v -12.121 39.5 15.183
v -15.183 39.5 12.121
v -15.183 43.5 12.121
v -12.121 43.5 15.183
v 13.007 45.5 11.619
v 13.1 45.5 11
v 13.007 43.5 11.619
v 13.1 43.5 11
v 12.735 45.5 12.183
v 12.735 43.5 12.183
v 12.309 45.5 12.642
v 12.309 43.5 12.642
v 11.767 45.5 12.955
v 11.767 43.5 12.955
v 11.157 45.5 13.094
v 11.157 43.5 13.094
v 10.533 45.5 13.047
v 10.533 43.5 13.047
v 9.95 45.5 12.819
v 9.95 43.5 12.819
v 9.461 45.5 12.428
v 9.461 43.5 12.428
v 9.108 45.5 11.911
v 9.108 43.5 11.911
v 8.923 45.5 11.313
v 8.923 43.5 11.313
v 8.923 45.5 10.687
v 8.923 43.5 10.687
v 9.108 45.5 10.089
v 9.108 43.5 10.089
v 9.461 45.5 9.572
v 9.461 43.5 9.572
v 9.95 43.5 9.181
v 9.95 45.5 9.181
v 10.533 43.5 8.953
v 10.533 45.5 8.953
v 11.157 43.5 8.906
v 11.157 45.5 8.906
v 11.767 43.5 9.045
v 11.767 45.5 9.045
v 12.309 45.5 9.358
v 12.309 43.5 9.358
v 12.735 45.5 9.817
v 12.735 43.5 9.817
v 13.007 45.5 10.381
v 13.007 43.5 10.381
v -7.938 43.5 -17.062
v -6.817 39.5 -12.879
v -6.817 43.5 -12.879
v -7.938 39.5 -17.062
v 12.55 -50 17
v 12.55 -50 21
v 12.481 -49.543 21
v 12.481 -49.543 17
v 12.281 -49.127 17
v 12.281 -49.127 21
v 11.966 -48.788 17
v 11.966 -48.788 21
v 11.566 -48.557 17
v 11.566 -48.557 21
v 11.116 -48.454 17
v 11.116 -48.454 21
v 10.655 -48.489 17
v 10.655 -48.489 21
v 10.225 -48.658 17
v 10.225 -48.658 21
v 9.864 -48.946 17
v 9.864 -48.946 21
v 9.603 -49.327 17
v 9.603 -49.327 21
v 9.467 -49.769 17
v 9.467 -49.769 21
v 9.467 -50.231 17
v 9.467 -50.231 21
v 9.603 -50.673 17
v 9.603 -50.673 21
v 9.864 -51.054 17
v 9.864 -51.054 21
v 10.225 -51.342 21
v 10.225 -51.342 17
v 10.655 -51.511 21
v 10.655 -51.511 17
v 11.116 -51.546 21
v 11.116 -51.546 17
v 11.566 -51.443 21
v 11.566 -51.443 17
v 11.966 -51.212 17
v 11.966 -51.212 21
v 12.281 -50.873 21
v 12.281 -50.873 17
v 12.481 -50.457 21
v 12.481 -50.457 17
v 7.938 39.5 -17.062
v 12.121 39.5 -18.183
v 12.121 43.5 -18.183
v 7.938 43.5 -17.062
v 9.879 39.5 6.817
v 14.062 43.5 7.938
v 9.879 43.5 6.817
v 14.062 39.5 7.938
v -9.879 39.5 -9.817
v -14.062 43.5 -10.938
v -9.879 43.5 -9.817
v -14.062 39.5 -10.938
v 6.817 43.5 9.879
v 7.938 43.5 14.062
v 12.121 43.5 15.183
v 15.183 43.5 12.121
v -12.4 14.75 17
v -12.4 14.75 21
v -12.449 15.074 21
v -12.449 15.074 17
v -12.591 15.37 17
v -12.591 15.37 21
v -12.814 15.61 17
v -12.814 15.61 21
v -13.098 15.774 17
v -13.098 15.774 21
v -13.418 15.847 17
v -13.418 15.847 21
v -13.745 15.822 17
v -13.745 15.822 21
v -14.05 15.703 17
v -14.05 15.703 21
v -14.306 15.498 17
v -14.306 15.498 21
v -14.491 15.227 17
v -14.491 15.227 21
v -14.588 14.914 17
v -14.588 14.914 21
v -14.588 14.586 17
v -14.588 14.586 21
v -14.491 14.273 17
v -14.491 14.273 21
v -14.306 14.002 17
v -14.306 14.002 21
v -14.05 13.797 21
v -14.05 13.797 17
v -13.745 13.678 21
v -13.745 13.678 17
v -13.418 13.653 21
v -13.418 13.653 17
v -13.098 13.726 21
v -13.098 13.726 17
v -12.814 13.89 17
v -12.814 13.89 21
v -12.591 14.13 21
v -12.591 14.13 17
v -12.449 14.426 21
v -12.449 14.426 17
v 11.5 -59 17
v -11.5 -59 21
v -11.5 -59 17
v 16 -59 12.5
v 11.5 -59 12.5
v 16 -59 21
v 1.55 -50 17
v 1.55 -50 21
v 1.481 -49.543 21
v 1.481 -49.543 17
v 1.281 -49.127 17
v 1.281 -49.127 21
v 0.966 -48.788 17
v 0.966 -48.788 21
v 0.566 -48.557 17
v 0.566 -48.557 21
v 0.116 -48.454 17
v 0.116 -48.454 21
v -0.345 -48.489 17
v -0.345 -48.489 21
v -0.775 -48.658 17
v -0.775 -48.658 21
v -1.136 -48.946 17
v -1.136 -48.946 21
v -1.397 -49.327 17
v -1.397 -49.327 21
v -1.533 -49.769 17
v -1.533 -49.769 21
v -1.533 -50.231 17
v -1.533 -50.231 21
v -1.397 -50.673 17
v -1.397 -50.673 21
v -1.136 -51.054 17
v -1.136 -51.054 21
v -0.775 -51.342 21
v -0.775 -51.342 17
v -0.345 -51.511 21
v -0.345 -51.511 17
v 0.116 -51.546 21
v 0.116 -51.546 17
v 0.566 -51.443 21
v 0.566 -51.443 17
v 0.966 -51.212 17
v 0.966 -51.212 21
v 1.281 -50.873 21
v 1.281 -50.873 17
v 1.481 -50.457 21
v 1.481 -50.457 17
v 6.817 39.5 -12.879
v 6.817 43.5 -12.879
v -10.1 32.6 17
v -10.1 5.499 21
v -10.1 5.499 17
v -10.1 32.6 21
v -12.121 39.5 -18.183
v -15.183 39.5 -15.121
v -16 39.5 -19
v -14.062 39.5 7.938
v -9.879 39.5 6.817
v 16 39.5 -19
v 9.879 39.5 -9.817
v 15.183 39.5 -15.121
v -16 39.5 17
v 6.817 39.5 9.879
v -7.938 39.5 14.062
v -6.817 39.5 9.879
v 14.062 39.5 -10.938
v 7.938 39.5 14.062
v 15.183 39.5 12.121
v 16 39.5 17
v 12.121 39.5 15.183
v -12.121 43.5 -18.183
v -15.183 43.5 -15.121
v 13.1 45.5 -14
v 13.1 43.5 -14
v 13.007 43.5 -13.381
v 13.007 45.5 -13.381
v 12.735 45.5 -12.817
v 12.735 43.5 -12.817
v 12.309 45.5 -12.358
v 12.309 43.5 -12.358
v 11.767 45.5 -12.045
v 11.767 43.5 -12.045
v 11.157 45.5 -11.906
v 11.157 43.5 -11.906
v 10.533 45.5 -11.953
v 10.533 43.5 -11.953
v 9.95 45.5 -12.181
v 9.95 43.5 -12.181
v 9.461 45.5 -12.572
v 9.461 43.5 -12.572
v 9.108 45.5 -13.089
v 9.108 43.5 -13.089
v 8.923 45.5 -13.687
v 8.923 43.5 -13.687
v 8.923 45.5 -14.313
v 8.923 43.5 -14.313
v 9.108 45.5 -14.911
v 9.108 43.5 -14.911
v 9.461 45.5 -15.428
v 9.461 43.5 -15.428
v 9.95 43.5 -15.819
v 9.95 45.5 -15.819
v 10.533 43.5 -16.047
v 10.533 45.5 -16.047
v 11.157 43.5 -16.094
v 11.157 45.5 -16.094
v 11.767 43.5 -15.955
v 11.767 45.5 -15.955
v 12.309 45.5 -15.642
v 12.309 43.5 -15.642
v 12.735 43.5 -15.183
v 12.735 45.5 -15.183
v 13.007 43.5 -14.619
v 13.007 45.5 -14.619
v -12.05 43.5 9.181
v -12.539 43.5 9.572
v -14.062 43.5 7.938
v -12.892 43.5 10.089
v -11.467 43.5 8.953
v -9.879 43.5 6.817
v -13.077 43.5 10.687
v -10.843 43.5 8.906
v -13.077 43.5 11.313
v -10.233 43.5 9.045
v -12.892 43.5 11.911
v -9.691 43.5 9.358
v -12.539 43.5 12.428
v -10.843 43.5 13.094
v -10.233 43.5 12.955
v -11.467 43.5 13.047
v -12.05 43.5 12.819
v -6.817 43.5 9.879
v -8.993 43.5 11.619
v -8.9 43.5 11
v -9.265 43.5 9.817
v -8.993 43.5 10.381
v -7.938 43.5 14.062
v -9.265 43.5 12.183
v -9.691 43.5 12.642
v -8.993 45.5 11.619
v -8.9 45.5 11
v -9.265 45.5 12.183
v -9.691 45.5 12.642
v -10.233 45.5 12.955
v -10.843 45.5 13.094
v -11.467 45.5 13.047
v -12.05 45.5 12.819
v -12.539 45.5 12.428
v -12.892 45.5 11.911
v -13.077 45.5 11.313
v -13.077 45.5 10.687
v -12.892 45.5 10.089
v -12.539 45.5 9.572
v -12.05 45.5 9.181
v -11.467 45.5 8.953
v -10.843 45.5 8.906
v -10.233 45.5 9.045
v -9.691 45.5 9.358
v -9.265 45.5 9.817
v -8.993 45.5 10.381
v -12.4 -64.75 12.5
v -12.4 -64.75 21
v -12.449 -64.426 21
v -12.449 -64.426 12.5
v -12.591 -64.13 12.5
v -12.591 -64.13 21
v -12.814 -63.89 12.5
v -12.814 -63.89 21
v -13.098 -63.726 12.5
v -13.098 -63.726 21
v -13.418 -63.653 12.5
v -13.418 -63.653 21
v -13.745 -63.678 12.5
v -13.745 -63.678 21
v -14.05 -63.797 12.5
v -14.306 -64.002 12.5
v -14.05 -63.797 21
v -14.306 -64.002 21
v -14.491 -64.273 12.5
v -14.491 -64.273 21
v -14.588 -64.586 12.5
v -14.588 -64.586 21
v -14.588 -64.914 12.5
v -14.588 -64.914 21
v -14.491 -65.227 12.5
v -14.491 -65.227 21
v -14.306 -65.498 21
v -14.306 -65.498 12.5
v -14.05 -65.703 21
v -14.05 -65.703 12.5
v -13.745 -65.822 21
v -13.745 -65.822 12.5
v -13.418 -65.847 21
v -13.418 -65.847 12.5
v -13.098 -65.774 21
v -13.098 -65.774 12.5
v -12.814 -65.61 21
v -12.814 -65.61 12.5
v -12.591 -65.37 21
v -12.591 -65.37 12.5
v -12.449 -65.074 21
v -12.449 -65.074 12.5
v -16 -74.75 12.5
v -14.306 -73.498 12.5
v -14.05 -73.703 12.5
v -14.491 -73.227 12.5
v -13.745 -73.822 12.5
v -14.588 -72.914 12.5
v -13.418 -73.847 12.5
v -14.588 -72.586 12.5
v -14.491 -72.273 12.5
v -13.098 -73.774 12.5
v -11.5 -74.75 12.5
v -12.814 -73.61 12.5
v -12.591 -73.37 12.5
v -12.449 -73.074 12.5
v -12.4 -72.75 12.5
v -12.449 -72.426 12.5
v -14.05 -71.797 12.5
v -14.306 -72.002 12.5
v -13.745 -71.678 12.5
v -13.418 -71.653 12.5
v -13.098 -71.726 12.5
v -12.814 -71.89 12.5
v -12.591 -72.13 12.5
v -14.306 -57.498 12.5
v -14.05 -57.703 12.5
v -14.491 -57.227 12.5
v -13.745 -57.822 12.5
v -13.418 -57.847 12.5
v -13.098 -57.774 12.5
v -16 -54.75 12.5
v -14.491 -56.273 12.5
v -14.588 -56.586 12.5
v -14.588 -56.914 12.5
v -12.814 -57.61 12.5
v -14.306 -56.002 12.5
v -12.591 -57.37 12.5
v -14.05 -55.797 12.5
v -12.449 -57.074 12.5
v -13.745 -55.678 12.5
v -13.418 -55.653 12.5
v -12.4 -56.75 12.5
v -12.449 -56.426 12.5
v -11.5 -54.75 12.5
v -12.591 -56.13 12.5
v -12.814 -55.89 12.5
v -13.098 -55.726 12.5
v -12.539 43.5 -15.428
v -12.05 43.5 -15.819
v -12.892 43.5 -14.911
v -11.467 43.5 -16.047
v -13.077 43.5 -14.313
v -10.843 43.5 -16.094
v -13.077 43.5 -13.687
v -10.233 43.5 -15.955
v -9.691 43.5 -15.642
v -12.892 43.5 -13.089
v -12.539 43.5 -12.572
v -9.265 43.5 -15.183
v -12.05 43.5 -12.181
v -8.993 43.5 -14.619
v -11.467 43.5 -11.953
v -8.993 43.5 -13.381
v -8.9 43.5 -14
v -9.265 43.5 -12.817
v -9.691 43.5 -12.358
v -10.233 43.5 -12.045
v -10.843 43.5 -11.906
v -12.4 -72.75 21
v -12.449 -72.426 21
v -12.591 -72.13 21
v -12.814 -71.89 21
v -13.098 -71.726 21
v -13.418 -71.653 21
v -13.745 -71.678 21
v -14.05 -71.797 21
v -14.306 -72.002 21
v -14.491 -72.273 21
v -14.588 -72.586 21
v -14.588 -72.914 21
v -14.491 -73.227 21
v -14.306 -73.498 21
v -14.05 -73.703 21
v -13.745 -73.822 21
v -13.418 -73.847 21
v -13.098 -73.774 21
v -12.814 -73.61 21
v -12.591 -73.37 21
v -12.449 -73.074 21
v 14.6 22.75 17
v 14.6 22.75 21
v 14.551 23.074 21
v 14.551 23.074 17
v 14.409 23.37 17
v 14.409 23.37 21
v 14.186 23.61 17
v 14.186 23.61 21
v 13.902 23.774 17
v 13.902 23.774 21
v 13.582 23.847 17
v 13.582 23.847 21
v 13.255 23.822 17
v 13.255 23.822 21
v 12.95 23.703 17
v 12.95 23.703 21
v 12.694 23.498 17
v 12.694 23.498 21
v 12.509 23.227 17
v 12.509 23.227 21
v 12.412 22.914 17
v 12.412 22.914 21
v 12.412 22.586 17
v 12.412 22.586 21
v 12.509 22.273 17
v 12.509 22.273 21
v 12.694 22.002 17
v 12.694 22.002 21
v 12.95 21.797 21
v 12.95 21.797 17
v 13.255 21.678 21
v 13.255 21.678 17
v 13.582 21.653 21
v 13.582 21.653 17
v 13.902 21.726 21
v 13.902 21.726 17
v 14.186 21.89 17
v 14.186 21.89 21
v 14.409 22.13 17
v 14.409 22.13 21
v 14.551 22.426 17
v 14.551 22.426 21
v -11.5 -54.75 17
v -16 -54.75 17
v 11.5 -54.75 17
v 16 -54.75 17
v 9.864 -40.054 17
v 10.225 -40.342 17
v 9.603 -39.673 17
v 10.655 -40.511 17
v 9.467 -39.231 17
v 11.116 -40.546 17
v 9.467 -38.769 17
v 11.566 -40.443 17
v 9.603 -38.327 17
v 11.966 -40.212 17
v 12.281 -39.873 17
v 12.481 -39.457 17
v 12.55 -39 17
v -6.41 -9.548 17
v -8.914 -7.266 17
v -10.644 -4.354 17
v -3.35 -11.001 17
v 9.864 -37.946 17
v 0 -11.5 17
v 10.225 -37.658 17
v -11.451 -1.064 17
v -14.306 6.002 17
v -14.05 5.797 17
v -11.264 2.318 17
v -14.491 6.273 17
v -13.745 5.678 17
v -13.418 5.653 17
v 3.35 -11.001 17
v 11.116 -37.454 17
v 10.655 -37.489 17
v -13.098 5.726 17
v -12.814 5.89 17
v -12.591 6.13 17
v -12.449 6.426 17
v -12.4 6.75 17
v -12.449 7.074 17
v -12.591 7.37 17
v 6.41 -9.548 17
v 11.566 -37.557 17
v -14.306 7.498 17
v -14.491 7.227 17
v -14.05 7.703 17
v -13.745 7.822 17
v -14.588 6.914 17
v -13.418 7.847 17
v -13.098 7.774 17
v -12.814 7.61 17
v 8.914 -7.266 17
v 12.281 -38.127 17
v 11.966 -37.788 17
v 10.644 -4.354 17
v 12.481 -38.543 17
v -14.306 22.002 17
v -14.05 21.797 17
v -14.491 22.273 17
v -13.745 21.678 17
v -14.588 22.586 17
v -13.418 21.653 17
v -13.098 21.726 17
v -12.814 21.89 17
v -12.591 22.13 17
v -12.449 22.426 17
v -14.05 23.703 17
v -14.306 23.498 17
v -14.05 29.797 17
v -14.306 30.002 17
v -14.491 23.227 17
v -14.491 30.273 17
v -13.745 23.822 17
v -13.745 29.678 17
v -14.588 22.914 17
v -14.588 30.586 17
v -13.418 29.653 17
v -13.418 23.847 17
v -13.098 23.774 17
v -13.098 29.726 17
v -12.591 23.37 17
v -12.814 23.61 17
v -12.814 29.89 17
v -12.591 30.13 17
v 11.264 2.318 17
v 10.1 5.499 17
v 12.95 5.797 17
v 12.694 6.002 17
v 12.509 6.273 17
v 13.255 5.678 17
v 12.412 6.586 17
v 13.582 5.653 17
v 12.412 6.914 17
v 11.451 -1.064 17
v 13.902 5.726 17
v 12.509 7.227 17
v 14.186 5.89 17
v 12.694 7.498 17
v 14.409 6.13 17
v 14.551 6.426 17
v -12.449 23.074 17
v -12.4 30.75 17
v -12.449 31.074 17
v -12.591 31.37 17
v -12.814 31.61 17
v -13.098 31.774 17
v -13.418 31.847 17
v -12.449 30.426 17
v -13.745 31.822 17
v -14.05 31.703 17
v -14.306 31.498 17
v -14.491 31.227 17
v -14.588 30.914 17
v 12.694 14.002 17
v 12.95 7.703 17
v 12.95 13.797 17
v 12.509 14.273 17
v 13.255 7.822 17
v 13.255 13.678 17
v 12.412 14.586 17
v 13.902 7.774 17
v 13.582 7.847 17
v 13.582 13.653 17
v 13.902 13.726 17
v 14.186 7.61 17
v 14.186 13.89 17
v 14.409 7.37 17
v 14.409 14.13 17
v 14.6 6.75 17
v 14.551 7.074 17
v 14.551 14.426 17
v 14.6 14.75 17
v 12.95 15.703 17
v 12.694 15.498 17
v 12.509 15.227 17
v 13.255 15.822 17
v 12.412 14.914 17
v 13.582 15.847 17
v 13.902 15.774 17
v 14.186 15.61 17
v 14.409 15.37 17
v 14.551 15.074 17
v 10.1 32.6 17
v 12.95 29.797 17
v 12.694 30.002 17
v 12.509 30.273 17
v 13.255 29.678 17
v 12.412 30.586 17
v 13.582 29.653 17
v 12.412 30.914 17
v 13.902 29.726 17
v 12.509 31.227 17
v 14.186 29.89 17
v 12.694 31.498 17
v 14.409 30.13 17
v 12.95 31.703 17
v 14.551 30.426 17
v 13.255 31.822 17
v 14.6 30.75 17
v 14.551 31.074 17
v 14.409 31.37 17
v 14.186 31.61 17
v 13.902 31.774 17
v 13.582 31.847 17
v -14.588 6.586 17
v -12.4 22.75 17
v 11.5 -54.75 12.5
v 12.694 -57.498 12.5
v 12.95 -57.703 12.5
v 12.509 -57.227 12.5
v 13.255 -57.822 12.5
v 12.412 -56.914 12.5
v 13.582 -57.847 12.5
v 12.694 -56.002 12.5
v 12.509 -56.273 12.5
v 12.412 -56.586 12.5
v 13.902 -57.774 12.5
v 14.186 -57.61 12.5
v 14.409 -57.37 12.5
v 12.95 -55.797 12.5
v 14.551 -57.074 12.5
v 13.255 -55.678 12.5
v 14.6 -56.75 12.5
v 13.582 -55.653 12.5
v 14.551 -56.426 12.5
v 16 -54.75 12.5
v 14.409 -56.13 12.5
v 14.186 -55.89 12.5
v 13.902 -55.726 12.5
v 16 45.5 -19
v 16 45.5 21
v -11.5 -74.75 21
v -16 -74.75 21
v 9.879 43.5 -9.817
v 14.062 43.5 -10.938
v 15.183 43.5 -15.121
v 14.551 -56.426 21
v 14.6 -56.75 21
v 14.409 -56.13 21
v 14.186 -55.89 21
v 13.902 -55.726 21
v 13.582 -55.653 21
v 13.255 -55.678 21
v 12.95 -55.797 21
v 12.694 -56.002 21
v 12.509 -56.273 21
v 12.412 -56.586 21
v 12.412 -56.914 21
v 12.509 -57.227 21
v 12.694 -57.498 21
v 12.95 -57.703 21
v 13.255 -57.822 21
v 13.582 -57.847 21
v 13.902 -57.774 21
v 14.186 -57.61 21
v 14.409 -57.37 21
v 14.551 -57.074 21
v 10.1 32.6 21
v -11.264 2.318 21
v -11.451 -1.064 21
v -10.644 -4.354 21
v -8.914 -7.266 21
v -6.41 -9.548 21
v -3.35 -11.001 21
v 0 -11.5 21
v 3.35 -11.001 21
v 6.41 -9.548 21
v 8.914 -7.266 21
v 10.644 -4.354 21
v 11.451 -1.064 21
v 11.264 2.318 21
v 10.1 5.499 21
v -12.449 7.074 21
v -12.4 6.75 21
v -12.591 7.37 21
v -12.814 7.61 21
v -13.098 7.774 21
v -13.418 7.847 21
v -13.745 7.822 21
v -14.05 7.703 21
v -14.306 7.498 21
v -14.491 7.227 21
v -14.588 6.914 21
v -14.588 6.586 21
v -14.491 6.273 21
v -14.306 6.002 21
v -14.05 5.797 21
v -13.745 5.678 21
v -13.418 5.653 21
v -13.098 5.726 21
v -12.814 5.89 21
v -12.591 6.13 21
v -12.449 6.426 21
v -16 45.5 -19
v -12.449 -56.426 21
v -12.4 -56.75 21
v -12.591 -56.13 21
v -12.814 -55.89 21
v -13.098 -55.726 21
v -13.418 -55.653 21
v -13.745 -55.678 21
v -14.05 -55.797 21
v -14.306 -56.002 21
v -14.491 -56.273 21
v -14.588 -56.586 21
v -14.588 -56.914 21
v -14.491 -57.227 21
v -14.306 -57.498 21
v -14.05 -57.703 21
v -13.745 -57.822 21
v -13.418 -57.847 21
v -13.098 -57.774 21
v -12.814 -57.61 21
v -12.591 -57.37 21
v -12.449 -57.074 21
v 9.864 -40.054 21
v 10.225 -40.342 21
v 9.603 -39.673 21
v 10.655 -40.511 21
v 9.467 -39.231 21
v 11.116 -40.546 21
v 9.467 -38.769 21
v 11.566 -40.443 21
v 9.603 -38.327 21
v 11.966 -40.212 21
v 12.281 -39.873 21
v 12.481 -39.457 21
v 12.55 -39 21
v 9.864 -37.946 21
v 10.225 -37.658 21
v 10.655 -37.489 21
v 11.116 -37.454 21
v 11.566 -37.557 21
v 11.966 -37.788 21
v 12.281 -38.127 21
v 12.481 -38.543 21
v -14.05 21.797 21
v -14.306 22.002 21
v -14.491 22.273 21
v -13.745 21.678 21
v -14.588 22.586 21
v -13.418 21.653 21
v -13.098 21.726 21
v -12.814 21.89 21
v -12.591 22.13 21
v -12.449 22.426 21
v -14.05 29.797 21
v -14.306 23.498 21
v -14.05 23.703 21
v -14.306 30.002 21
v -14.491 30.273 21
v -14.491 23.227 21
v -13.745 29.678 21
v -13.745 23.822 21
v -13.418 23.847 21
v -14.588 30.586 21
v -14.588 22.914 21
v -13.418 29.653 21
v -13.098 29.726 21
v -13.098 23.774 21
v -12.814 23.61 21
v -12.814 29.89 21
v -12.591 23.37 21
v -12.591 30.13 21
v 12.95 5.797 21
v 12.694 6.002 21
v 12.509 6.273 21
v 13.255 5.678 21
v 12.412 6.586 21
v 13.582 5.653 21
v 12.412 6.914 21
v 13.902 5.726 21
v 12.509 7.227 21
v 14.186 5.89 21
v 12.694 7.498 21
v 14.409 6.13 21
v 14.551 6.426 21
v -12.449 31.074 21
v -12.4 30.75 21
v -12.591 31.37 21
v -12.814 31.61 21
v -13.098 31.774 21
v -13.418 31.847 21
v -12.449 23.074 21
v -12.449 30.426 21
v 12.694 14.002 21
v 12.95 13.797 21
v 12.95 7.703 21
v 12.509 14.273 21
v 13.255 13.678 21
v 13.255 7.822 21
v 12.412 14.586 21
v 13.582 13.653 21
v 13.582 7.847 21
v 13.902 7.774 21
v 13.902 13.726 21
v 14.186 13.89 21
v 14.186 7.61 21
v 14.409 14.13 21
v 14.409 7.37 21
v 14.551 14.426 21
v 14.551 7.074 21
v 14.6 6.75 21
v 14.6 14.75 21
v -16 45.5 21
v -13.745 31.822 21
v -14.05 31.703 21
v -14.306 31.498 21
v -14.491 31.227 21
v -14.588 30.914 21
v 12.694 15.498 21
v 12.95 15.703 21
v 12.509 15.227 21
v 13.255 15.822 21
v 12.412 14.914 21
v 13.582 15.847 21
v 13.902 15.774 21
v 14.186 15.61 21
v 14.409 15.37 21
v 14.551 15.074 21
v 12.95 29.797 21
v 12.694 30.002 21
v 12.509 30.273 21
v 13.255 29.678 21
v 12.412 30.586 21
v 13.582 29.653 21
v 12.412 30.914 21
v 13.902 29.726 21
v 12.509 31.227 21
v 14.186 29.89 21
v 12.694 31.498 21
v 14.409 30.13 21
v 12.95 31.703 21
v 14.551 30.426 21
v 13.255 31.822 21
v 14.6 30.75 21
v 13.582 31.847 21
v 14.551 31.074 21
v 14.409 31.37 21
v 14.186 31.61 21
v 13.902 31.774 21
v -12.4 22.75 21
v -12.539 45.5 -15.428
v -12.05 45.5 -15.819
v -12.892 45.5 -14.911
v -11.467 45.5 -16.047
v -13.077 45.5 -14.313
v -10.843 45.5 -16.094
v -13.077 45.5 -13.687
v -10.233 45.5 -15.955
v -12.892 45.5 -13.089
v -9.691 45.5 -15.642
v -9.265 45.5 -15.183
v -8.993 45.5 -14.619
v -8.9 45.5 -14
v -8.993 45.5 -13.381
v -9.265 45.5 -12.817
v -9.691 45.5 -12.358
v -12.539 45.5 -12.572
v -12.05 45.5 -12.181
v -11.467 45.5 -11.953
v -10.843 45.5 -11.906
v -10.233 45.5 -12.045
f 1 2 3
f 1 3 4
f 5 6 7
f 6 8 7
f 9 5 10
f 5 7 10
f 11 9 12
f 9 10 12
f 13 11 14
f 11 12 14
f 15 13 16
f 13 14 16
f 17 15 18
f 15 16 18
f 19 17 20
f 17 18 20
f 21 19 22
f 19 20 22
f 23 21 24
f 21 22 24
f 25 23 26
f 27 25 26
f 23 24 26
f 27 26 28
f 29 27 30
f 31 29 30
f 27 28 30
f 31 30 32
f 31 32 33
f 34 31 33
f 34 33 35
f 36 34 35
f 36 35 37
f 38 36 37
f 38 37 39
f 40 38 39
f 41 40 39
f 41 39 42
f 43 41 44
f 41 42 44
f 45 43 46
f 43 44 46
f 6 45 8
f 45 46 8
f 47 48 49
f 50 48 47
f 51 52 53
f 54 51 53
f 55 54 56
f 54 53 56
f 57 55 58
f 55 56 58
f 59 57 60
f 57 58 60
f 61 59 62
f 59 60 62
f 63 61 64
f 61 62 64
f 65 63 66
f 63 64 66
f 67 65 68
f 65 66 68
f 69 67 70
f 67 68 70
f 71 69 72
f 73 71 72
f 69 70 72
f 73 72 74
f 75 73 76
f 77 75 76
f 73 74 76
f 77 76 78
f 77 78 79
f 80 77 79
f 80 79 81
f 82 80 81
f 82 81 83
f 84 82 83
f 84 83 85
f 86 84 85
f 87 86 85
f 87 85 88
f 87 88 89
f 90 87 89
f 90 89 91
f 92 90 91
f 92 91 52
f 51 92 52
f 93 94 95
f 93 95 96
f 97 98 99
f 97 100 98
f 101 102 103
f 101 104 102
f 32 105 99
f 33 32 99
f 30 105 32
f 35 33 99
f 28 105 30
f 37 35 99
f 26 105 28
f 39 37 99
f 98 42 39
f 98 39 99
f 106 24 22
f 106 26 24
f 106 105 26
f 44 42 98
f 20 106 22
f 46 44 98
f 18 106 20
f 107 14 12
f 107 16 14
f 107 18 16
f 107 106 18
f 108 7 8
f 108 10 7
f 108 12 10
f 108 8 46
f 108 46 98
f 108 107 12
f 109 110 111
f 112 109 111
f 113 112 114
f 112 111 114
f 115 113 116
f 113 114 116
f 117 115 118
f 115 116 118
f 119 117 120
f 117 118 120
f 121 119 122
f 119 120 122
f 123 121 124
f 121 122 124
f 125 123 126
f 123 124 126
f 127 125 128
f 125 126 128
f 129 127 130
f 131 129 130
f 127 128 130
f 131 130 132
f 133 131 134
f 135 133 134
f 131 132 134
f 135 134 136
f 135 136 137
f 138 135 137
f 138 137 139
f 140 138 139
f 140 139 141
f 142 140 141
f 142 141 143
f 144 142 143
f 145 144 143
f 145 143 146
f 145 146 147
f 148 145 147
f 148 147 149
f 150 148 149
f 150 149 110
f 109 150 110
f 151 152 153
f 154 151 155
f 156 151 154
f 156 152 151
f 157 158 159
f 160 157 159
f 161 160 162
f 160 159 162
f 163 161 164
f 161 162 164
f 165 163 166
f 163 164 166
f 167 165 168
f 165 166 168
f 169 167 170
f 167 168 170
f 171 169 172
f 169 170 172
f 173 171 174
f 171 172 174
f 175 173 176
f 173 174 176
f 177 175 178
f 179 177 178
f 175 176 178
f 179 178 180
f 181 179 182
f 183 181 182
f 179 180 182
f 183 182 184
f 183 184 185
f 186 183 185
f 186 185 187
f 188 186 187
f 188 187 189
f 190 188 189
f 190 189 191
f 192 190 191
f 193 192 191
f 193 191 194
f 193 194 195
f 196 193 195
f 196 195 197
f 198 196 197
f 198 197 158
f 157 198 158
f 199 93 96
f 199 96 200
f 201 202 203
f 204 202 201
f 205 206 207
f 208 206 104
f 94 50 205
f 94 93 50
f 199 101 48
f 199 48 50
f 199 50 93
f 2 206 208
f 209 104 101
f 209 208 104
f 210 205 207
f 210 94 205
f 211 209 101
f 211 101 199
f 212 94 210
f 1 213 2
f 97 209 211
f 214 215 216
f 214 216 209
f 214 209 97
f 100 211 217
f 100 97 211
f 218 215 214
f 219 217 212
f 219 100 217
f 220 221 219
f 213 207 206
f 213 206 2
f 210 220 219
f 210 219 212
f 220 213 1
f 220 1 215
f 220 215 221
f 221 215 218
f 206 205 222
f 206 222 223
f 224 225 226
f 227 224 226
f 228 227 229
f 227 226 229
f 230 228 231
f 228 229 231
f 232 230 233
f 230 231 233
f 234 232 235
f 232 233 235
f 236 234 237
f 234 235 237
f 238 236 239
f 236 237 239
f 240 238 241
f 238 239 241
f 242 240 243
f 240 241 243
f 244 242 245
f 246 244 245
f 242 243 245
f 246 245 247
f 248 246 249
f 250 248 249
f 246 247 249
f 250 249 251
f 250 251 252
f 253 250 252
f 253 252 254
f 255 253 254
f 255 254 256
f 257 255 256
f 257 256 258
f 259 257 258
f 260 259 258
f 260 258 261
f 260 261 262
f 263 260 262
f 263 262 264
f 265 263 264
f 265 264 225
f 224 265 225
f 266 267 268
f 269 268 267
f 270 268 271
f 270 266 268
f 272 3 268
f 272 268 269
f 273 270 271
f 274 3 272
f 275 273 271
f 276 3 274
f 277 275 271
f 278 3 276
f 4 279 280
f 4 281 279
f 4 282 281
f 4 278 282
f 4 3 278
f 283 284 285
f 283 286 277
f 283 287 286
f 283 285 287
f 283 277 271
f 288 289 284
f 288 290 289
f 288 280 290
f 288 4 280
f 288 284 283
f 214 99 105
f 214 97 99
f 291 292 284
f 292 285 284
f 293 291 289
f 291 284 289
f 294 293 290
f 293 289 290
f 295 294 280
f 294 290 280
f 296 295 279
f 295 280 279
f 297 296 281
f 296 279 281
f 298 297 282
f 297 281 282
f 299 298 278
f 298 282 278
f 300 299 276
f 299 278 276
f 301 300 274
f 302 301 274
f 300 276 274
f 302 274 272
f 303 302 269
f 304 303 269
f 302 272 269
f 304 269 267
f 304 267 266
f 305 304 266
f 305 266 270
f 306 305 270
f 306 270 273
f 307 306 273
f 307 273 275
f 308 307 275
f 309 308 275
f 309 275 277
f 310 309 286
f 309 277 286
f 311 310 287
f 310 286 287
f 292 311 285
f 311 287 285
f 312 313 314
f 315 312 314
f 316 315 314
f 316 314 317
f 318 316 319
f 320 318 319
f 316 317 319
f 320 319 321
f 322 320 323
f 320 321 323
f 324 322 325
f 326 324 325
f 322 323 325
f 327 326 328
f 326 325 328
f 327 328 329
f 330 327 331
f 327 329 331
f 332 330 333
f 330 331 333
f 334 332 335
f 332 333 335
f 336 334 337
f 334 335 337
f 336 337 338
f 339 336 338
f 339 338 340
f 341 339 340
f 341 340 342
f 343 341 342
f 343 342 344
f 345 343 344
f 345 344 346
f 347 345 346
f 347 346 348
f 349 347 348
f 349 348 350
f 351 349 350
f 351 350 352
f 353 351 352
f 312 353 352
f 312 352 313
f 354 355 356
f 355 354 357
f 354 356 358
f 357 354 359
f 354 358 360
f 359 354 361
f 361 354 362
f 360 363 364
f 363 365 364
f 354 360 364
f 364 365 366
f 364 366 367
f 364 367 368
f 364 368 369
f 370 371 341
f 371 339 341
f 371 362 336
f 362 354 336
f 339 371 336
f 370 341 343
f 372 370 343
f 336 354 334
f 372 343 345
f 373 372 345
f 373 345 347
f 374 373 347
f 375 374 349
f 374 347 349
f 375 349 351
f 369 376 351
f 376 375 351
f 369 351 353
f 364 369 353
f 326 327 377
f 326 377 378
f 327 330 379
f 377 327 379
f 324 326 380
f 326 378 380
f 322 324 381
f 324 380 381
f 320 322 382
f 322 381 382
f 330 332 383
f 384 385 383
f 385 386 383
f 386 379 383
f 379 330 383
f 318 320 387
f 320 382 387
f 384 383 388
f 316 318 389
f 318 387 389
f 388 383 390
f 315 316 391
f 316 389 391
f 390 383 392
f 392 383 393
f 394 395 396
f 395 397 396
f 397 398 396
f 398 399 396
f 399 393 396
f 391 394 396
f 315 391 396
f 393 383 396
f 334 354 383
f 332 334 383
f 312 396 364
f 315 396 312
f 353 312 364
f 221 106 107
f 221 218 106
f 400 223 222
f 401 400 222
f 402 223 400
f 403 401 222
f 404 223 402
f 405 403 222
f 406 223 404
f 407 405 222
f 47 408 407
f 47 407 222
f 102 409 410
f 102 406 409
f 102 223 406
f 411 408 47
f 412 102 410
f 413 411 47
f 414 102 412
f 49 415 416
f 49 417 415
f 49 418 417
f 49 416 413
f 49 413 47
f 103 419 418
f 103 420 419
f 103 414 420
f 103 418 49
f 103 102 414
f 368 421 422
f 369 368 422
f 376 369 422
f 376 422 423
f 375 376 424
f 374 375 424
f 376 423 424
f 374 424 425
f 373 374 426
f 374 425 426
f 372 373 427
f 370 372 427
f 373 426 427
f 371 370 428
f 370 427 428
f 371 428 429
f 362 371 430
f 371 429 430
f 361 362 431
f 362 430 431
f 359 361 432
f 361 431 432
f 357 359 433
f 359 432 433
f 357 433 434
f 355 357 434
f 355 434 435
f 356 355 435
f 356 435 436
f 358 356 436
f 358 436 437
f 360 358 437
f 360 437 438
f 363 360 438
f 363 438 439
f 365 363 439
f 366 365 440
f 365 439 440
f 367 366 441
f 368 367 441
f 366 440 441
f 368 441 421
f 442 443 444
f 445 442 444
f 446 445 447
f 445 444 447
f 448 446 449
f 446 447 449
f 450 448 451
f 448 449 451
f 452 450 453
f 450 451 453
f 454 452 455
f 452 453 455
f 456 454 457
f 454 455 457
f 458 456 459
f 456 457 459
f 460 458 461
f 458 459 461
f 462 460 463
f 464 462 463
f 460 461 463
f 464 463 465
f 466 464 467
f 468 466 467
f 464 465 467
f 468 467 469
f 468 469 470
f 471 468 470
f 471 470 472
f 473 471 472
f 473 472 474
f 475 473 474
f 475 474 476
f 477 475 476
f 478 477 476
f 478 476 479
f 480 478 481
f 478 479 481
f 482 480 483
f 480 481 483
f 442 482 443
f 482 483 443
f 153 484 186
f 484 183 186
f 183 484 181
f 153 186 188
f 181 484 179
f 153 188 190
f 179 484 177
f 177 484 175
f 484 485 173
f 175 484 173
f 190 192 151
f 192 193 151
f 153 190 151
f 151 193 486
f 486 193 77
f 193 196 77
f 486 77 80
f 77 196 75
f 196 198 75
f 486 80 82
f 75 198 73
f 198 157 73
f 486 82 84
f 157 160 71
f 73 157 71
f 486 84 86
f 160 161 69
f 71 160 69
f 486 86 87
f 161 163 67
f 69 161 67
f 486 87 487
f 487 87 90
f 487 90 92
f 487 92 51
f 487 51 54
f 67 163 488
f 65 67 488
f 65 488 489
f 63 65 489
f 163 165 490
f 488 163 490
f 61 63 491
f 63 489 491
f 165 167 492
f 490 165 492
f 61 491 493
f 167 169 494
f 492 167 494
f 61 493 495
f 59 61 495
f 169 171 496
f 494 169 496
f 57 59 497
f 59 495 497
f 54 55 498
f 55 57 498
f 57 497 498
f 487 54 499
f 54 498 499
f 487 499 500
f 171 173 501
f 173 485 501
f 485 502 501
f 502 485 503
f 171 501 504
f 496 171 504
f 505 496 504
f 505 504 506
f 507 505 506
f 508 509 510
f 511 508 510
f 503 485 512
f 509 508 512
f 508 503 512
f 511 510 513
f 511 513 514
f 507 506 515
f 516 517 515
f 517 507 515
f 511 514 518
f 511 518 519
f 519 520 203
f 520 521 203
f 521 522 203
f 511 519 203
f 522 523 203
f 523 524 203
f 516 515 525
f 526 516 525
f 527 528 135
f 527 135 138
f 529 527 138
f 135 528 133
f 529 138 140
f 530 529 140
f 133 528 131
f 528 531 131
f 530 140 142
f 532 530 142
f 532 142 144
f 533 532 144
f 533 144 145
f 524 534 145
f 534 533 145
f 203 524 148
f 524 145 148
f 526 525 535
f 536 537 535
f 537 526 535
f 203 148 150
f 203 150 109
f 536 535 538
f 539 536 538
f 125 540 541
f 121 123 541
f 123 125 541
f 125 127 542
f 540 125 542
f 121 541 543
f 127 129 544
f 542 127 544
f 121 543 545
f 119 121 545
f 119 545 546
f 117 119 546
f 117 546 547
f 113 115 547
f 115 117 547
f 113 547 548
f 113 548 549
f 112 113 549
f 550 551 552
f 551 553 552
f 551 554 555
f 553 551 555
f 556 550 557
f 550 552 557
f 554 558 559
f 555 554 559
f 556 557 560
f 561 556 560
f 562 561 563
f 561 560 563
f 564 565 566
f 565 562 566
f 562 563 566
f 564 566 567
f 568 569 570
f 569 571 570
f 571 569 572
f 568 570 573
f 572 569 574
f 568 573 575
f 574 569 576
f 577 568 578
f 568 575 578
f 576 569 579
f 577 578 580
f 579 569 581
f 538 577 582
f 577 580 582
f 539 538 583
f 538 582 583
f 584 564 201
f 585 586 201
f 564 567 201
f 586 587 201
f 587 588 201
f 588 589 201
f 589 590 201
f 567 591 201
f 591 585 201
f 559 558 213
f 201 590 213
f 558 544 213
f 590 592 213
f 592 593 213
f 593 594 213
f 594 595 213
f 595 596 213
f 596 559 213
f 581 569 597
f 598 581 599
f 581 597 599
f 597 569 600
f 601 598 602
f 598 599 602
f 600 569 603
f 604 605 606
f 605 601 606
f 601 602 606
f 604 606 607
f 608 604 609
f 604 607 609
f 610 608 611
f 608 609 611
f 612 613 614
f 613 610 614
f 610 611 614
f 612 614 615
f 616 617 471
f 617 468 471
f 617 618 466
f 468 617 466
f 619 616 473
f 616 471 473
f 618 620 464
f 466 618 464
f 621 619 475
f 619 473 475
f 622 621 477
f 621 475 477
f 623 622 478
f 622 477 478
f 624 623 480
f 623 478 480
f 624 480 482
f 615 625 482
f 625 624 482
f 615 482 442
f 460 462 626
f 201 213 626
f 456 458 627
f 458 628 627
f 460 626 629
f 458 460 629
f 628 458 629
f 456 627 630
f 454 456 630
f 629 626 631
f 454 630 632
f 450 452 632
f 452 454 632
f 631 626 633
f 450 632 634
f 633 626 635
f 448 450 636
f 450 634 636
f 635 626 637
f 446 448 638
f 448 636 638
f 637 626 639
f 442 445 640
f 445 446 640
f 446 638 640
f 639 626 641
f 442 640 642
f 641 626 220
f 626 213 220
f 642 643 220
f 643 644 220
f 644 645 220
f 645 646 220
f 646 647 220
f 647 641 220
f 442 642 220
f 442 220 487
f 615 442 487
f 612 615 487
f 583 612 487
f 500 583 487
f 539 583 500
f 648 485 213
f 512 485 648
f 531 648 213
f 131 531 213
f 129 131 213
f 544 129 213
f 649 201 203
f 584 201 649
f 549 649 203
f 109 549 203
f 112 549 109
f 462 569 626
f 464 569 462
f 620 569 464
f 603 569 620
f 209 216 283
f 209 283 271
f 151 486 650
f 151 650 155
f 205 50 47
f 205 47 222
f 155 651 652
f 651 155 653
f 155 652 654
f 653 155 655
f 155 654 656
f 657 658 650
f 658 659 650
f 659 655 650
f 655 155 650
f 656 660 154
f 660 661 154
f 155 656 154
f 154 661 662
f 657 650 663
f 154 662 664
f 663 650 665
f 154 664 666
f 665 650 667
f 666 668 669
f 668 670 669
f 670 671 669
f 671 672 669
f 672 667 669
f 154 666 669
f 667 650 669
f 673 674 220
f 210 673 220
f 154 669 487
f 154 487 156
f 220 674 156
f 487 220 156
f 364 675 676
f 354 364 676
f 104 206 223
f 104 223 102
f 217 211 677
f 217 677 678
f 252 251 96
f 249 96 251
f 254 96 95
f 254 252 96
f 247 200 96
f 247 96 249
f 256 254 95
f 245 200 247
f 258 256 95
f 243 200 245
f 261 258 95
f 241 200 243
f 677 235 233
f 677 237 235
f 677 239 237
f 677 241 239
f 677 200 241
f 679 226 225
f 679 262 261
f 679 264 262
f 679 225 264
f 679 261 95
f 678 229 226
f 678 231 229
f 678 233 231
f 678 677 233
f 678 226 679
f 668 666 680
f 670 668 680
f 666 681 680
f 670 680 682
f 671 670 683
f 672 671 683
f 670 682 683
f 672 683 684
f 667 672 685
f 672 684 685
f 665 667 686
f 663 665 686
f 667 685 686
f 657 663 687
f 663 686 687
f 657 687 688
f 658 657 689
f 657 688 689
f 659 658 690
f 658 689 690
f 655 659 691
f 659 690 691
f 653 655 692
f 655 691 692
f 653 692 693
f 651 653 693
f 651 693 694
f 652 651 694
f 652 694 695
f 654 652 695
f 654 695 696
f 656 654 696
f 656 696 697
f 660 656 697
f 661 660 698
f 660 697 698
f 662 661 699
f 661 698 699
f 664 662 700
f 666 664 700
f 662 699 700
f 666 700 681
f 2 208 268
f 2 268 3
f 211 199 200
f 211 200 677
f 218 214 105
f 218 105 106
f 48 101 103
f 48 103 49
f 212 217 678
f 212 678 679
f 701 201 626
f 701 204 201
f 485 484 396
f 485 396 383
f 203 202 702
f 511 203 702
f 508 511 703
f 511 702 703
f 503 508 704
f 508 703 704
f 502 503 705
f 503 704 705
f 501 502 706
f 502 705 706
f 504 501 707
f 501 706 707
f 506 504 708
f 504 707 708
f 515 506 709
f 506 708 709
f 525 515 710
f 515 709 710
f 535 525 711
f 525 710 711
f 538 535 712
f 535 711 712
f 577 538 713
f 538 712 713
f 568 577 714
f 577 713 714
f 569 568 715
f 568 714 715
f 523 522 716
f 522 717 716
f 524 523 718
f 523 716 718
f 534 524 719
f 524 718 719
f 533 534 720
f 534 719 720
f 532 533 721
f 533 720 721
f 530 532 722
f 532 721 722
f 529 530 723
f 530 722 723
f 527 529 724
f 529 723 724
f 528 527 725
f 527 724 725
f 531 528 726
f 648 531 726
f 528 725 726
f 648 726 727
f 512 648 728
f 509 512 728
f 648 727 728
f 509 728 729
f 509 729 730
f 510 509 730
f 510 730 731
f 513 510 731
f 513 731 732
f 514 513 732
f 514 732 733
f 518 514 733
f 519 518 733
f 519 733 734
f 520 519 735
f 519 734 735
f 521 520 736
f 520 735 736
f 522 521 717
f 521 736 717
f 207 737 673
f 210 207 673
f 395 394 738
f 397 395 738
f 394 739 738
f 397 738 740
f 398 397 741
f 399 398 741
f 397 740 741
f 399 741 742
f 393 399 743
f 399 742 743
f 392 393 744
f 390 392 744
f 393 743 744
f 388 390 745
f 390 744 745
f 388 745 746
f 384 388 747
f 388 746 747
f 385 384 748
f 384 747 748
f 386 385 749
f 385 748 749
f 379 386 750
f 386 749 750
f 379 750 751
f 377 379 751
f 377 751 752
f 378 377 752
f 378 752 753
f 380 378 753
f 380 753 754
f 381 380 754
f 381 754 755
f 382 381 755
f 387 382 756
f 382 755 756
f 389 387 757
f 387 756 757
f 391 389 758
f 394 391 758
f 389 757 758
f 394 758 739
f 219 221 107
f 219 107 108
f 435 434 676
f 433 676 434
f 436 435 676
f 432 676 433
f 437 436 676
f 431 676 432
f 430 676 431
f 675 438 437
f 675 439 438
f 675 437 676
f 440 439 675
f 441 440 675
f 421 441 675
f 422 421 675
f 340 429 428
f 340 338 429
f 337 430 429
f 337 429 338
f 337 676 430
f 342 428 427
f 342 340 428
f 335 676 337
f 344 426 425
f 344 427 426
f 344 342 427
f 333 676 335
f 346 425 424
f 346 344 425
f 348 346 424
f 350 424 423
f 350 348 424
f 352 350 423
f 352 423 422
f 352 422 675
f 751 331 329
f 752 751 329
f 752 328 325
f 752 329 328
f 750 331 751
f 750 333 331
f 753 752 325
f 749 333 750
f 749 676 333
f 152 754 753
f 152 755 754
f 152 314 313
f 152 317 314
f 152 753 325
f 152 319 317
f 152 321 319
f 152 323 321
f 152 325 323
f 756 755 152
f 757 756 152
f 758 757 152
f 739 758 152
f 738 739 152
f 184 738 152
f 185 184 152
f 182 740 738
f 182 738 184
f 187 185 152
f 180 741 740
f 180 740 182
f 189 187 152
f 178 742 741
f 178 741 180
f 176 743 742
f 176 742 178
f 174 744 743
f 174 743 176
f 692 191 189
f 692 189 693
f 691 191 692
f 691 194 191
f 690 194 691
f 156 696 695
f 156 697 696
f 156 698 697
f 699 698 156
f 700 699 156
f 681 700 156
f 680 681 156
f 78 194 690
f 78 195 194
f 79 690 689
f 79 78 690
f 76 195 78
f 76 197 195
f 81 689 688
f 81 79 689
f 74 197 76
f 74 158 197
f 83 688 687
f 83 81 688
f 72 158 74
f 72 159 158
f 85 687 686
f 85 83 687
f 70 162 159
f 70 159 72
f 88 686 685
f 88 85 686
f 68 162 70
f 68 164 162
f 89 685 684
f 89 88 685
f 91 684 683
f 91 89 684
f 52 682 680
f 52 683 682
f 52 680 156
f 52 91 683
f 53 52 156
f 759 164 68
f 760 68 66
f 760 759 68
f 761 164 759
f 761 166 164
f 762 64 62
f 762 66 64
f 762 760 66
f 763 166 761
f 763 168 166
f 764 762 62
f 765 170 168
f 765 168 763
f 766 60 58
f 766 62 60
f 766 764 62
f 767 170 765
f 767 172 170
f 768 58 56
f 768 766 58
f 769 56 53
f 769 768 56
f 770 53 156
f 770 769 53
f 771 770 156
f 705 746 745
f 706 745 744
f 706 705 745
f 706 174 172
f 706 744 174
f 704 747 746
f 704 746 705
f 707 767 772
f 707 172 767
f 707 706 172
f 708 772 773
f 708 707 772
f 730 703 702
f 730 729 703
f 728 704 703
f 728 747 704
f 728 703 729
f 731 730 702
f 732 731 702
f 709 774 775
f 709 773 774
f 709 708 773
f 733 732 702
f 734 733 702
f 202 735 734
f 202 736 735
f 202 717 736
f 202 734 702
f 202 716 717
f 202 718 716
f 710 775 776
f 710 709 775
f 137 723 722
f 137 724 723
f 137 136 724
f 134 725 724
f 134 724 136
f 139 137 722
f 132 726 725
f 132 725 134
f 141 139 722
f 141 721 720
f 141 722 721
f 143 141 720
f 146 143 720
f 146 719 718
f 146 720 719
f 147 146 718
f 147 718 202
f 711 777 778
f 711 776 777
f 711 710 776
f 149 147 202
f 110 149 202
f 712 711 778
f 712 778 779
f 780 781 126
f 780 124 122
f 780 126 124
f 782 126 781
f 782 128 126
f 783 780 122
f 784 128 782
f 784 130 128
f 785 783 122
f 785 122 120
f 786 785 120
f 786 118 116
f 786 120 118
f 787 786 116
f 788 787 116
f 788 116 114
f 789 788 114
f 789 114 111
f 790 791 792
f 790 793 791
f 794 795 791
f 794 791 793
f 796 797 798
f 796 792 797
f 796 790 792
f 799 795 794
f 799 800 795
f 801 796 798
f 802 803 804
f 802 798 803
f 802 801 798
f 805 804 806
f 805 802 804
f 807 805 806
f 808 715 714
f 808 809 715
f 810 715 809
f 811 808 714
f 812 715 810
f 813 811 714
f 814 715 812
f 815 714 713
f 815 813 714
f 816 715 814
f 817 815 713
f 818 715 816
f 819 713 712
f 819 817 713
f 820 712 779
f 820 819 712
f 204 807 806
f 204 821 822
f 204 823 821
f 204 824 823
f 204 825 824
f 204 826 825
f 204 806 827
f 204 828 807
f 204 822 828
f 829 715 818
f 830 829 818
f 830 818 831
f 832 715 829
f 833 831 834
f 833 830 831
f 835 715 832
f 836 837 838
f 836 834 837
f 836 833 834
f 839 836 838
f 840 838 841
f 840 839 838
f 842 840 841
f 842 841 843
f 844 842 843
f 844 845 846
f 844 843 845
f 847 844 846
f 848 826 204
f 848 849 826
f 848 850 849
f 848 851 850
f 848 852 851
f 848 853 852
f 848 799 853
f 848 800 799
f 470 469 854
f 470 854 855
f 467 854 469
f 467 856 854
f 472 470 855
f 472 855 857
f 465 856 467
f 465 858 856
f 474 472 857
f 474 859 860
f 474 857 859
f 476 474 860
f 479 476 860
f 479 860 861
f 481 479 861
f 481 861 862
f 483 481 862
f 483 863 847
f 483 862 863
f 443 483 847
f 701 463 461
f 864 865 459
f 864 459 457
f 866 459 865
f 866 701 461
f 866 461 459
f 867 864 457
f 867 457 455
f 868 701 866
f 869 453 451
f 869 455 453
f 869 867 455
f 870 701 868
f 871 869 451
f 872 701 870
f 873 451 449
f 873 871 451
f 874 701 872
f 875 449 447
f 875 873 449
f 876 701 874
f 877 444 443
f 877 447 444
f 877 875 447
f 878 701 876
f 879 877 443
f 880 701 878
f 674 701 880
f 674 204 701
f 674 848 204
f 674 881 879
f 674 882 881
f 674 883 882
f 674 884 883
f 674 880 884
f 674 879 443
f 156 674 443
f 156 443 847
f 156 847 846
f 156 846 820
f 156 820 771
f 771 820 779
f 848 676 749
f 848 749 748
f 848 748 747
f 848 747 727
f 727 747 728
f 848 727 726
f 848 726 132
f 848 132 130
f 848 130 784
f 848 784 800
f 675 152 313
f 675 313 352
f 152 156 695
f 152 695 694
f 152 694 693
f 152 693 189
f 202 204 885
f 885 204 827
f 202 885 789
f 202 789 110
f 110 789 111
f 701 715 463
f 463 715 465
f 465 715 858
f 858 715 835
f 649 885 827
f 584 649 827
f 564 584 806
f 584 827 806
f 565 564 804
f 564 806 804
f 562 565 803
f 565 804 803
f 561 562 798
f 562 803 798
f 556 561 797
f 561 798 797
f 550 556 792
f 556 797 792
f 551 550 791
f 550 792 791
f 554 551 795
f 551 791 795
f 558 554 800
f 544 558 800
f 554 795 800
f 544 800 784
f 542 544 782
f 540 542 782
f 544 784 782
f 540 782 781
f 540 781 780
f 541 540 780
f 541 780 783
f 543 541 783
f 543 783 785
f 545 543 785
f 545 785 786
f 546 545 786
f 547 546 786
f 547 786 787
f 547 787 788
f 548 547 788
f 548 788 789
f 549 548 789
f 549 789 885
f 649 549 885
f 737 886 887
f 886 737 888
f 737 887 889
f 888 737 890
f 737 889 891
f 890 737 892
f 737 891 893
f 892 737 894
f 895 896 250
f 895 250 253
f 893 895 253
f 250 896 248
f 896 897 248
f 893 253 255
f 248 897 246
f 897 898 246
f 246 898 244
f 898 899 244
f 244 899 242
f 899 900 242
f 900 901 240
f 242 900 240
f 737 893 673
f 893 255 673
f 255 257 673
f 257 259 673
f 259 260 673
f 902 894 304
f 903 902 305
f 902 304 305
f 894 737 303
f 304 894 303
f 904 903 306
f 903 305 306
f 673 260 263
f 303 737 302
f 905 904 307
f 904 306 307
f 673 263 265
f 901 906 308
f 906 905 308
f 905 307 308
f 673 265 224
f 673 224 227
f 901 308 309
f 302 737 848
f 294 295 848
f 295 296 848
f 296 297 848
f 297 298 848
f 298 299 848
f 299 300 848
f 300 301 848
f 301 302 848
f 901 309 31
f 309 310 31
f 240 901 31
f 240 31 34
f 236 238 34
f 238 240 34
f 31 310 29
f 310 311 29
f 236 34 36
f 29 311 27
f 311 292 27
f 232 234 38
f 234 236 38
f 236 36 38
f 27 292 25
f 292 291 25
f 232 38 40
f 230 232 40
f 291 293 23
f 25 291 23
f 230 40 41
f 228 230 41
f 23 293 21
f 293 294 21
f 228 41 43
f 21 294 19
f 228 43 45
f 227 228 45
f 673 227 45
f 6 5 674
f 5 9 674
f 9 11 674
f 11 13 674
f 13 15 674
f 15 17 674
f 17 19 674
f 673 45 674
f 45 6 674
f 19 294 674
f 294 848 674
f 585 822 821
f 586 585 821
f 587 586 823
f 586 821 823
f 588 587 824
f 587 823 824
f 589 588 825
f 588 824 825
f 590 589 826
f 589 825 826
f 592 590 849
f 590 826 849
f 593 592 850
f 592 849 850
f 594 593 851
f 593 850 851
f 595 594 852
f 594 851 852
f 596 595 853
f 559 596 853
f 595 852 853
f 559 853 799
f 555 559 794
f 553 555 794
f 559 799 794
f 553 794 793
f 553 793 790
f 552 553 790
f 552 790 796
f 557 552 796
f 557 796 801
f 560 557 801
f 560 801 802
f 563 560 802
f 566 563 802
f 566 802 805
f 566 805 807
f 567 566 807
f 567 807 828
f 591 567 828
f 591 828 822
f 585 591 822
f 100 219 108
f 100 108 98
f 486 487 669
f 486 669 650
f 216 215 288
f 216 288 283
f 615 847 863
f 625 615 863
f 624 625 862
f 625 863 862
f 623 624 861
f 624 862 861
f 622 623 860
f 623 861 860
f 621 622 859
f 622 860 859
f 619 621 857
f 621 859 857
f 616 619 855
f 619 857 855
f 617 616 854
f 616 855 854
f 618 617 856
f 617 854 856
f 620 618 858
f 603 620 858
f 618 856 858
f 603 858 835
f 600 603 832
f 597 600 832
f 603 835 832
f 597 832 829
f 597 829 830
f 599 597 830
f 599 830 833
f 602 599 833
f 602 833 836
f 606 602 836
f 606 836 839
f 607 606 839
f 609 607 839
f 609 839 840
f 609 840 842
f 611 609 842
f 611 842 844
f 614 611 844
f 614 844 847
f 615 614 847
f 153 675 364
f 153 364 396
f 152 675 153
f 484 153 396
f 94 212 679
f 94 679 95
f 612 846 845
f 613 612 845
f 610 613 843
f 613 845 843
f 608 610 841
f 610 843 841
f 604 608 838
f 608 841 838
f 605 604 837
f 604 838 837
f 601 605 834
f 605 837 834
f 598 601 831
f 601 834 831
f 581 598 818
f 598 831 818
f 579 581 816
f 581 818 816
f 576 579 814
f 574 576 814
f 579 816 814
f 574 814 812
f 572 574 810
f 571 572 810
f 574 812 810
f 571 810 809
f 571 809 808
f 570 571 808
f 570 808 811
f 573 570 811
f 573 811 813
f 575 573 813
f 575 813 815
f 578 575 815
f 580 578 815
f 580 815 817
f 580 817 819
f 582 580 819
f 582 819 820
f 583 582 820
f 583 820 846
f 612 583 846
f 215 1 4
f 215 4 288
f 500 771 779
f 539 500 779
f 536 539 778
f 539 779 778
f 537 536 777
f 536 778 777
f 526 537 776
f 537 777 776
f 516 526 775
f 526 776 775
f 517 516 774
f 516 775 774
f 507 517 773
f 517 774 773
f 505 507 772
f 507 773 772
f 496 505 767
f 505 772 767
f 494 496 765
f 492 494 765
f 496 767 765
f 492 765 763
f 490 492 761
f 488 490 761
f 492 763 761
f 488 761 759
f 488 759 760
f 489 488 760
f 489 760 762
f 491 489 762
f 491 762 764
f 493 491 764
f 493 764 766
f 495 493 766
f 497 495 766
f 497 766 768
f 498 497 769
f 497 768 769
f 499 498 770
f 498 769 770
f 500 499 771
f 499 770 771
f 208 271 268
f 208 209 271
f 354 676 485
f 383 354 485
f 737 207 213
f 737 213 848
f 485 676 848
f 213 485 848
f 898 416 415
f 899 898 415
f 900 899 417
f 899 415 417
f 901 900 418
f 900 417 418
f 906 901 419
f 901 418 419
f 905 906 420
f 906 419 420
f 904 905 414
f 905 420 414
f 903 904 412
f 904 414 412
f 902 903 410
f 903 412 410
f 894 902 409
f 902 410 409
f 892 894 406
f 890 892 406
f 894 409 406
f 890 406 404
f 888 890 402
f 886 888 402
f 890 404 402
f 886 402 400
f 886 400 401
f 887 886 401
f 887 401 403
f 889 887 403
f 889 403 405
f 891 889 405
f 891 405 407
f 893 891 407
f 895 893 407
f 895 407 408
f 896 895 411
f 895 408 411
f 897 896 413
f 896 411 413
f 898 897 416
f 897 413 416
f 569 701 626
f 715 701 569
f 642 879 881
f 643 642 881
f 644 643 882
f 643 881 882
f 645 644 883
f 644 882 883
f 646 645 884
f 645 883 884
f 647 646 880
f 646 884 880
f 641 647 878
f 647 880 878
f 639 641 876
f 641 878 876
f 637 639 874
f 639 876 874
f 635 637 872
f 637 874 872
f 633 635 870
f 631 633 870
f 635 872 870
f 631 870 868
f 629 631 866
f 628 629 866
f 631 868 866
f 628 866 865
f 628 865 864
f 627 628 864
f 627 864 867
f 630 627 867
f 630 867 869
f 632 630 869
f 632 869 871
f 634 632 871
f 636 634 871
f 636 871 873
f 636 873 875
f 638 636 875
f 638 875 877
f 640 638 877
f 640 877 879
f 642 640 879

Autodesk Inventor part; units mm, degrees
ref_plane "YZ Plane" through (0, 0, 0) normal (1, 0, 0) x (0, 1, 0)
ref_plane "XZ Plane" through (0, 0, 0) normal (0, 1, 0) x (-1, 0, 0)
ref_plane "Plan de construction4" through (0, 0, 21) normal (0, 0, 1) x (1, 0, 0)
sketch "Esquisse" plane through (0, 0, 21) normal (0, 0, 1) x (1, 0, 0)
  circle A0 centre (0, 0) radius 11.5
  line L0 (16, -11.5) -> (-16, -11.5) construction
  line L1 (-16, -11.5) -> (-16, 38.5)
  line L2 (-16, 38.5) -> (16, 38.5)
  line L3 (16, 38.5) -> (16, -11.5)
  line L4 (0, 0) -> (-13.5, 6.75) construction
  circle A1 centre (-13.5, 6.75) radius 1.1
  line L5 (-13.5, 6.75) -> (-13.5, 14.75) construction
  line L6 (-13.5, 14.75) -> (-13.5, 22.75) construction
  line L7 (-13.5, 22.75) -> (-13.5, 30.75) construction
  circle A2 centre (-13.5, 30.75) radius 1.1
  circle A3 centre (-13.5, 22.75) radius 1.1
  circle A4 centre (-13.5, 14.75) radius 1.1
  line L8 (-22.4, 0) -> (22.4, 0) construction
  line L9 (10.1, 32.6) -> (10.1, 5.4991)
  line L10 (-10.1, 5.4991) -> (-10.1, 32.6)
  line L11 (-10.1, 32.6) -> (10.1, 32.6)
  line L12 (16, -11.5) -> (0, 0) construction
  line L13 (-16, -11.5) -> (0, 0) construction
  line L14 (10.1, 5.4991) -> (-10.1, 5.4991) construction
  line L15 (16, 38.5) -> (-16, 38.5)
  line L16 (-16, 38.5) -> (-16, 39.5)
  line L17 (-16, 39.5) -> (16, 39.5)
  line L18 (16, 39.5) -> (16, 38.5)
  line L19 (0, -98.8) -> (0, 69.55) construction
  circle A5 centre (13.5, 6.75) radius 1.1
  circle A6 centre (13.5, 30.75) radius 1.1
  circle A7 centre (13.5, 22.75) radius 1.1
  circle A8 centre (13.5, 14.75) radius 1.1
  line L20 (-16, -11.5) -> (16, -11.5) construction
  line L21 (16, -11.5) -> (16, -16.5)
  line L22 (16, -16.5) -> (-16, -16.5)
  line L23 (-16, -16.5) -> (-16, -11.5)
  line L24 (16, 39.5) -> (-16, 39.5)
  line L25 (-16, 39.5) -> (-16, 45.5)
  line L26 (-16, 45.5) -> (16, 45.5)
  line L27 (16, 45.5) -> (16, 39.5)
  line L28 (16, -16.5) -> (-16, -16.5)
  line L29 (-16, -16.5) -> (-16, -59)
  line L30 (-16, -59) -> (-11.5, -59)
  line L31 (16, -59) -> (16, -16.5)
  circle A9 centre (0, -50) radius 1.55
  line L32 (13.5, -56.75) -> (-13.5, -56.75) construction
  line L33 (-13.5, -56.75) -> (-13.5, -64.75) construction
  line L34 (-13.5, -64.75) -> (-13.5, -72.75) construction
  line L35 (-13.5, -72.75) -> (13.5, -72.75) construction
  line L36 (13.5, -72.75) -> (13.5, -64.75) construction
  line L37 (13.5, -64.75) -> (13.5, -56.75) construction
  circle A10 centre (13.5, -72.75) radius 1.1
  circle A11 centre (13.5, -64.75) radius 1.1
  circle A12 centre (13.5, -56.75) radius 1.1
  circle A13 centre (-13.5, -56.75) radius 1.1
  circle A14 centre (-13.5, -64.75) radius 1.1
  circle A15 centre (-13.5, -72.75) radius 1.1
  line L38 (16, -54.75) -> (11.5, -54.75)
  line L39 (11.5, -54.75) -> (11.5, -59)
  line L40 (-11.5, -59) -> (-11.5, -54.75)
  line L41 (-11.5, -54.75) -> (-16, -54.75)
  line L42 (-11.5, -59) -> (16, -59)
  line L43 (-11.5, -59) -> (-11.5, -74.75)
  line L44 (-11.5, -74.75) -> (-16, -74.75)
  line L45 (-16, -74.75) -> (-16, -59)
  line L46 (0, -50) -> (11, -50) construction
  line L47 (11, -50) -> (11, -39) construction
  circle A16 centre (11, -50) radius 1.55
  circle A17 centre (11, -39) radius 1.55
  point P0 (0, -11.5)
  point P1 (16, -11.5)
  dimension "d107" = 23
  dimension "d133" = 6.75
  dimension "d135" = 2.2
  dimension "d137" = 8
  dimension "d138" = 20.2
  dimension "d160" = 50
  dimension "d161" = 5.9
  dimension "d162" = 32
  dimension "d163" = 11.5
  dimension "d169" = 5
  dimension "d224" = 1
  dimension "d225" = 6
  dimension "d240" = 13.5
  dimension "d242" = 32
  dimension "d243" = 3.1
  dimension "d249" = 50
  dimension "d250" = 6.75
  dimension "d251" = 8
  dimension "d252" = 2.2
  dimension "d253" = 2
  dimension "d254" = 2
  dimension "d255" = 9
  dimension "d258" = 2
  dimension "d261" = 3.1
  dimension "d263" = 11
  dimension "d264" = 11
extrude "Face fixation moteur" add sketch "Esquisse" against normal blind 4 contours L1 L2 L3 L21 L22 L23 | L16 L17 L18 L2 | L22 L31 L38 L39 L42 L40 L41 L29 | L41 L40 L30 L29 | L31 L42 L39 L38
extrude "Creux moteur" [suppressed]
extrude "Rai basl" add sketch "Esquisse" against normal blind 40 contours L25 L26 L27 L17
sketch "Esquisse16" plane through (-16, 39.5, 17) normal (0, -1, 0) x (1, 0, 0)
  line L0 (0, 0) -> (0, -36) projected
  line L1 (32, -36) -> (0, -36) projected
  line L2 (32, 0) -> (32, -36) projected
  line L3 (5, -6) -> (27, -6) construction
  line L4 (27, -6) -> (27, -31) construction
  line L5 (27, -31) -> (5, -31) construction
  line L6 (5, -31) -> (5, -6) construction
  line L7 (0, 0) -> (0, -36) projected
  line L8 (0, -1) -> (5, -6) construction
  line L9 (5, -31) -> (0, -36) construction
  line L10 (0, -36) -> (32, -36) projected
  line L11 (27, -31) -> (32, -36) construction
  circle A0 centre (5, -6) radius 2.1
  circle A1 centre (27, -6) radius 2.1
  circle A2 centre (27, -31) radius 2.1
  circle A3 centre (5, -31) radius 2.1
  line L12 (6.1207, -10.1826) -> (1.9381, -9.0619)
  line L13 (1.9381, -9.0619) -> (0.8174, -4.8793)
  line L14 (0.8174, -4.8793) -> (3.8793, -1.8174)
  line L15 (3.8793, -1.8174) -> (8.0619, -2.9381)
  line L16 (8.0619, -2.9381) -> (9.1826, -7.1207)
  line L17 (9.1826, -7.1207) -> (6.1207, -10.1826)
  line L18 (9.1826, -29.8793) -> (8.0619, -34.0619)
  line L19 (8.0619, -34.0619) -> (3.8793, -35.1826)
  line L20 (3.8793, -35.1826) -> (0.8174, -32.1207)
  line L21 (0.8174, -32.1207) -> (1.9381, -27.9381)
  line L22 (1.9381, -27.9381) -> (6.1207, -26.8174)
  line L23 (6.1207, -26.8174) -> (9.1826, -29.8793)
  line L24 (25.8793, -26.8174) -> (30.0619, -27.9381)
  line L25 (30.0619, -27.9381) -> (31.1826, -32.1207)
  line L26 (31.1826, -32.1207) -> (28.1207, -35.1826)
  line L27 (28.1207, -35.1826) -> (23.9381, -34.0619)
  line L28 (23.9381, -34.0619) -> (22.8174, -29.8793)
  line L29 (22.8174, -29.8793) -> (25.8793, -26.8174)
  line L30 (22.8174, -7.1207) -> (23.9381, -2.9381)
  line L31 (23.9381, -2.9381) -> (28.1207, -1.8174)
  line L32 (28.1207, -1.8174) -> (31.1826, -4.8793)
  line L33 (31.1826, -4.8793) -> (30.0619, -9.0619)
  line L34 (30.0619, -9.0619) -> (25.8793, -10.1826)
  line L35 (25.8793, -10.1826) -> (22.8174, -7.1207)
  line L36 (7.6517, -8.6517) -> (24.3483, -8.6517) construction
  line L37 (24.3483, -8.6517) -> (24.3483, -28.3483) construction
  line L38 (24.3483, -28.3483) -> (7.6517, -28.3483) construction
  line L39 (7.6517, -28.3483) -> (7.6517, -8.6517) construction
  line L40 (32, 4) -> (0, 4) projected
  line L41 (26.1, 4) -> (5.9, 4) projected
  line L42 (5.9, 4) -> (26.1, 4) projected
  line L43 (28.4, 4) -> (30.6, 4) projected
  line L44 (28.4, 4) -> (30.6, 4) projected
  line L45 (1.4, 4) -> (3.6, 4) projected
  line L46 (1.4, 4) -> (3.6, 4) projected
  line L47 (1.4, 4) -> (3.6, 4) projected
  line L48 (1.4, 4) -> (3.6, 4) projected
  line L49 (28.4, 4) -> (30.6, 4) projected
  line L50 (28.4, 4) -> (30.6, 4) projected
  line L51 (32, 0) -> (32, -36) projected
  line L52 (0, 0) -> (0, -36) projected
  line L53 (32, -1) -> (27, -6) construction
  line L54 (0, -1) -> (32, -1)
  line L55 (0, 0) -> (32, 0) projected
  line L56 (0, 4) -> (32, 4) projected
  point P0 (16, -17)
  dimension "d228" = 5
  dimension "d229" = 5
  dimension "d230" = 4.2
  dimension "d231" = 7.5
  dimension "d232" = 25
  dimension "d233" = 22
  dimension "d245" = 40
  dimension "d246" = 32
  dimension "d248" = 1
extrude "Extrusion23" cut sketch "Esquisse16" against normal through all contours A0 | A1 | A2 | A3
extrude "Extrusion24" cut sketch "Esquisse16" against normal blind 4 contours A3 | L12 L13 L14 L15 L16 L17 | L18 L19 L20 L21 L22 L23 | L24 L25 L26 L27 L28 L29 | L30 L31 L32 L33 L34 L35
extrude "Extrusion25" add sketch "Esquisse" against normal blind 8.5 contours L41 L40 L30 L29 | L31 L42 L39 L38 | L30 L43 L44 L45
properties part number "Support AX 12A"
